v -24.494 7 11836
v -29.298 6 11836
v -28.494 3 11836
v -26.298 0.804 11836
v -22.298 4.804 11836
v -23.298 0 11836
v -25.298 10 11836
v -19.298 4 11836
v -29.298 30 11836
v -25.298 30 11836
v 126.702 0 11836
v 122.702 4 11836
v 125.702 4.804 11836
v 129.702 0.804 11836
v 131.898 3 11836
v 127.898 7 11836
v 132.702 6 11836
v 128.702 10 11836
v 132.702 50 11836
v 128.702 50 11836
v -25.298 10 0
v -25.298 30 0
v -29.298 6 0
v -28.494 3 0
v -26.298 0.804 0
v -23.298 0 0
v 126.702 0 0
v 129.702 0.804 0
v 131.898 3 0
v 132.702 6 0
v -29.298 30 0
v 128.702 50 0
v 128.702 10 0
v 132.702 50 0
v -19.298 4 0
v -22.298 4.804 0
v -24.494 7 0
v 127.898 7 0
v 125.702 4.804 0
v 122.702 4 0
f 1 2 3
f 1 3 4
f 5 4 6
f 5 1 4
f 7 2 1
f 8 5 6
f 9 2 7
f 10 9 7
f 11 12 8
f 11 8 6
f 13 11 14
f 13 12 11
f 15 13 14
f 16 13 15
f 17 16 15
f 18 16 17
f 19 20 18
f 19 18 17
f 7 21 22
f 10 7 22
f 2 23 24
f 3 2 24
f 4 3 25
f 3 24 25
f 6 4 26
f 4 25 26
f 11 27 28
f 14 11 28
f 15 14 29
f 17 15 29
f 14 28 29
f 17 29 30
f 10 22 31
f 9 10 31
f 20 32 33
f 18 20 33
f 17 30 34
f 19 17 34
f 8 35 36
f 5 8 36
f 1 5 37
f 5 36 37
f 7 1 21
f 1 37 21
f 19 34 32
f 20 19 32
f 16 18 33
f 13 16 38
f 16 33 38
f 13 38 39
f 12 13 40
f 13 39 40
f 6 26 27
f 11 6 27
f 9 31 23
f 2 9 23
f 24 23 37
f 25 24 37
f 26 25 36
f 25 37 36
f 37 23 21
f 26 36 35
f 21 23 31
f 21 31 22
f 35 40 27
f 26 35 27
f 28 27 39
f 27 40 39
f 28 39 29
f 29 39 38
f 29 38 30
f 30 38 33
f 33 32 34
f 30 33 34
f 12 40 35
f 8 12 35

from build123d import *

# Parameters (mm, degrees)
F1_DEPTH = 11836


with BuildPart() as f1:
    # F0 (on Top) → F1 (new body)
    with BuildSketch(Plane.XY):
        with BuildLine():
            Line((-25.298244, 30), (-29.298244, 30))
            Line((-29.298244, 30), (-29.298244, 6))
            ThreePointArc((-29.298244, 6), (-27.540884, 1.757359), (-23.298244, 0))
            Line((-23.298244, 0), (126.701756, 0))
            ThreePointArc((126.701756, 0), (130.944397, 1.757359), (132.701756, 6))
            Line((132.701756, 6), (132.701756, 50))
            Line((132.701756, 50), (128.701756, 50))
            Line((128.701756, 50), (128.701756, 10))
            ThreePointArc((128.701756, 10), (126.944397, 5.757359), (122.701756, 4))
            Line((122.701756, 4), (-19.298244, 4))
            ThreePointArc((-19.298244, 4), (-23.540884, 5.757359), (-25.298244, 10))
            Line((-25.298244, 10), (-25.298244, 30))
        make_face()
    extrude(amount=F1_DEPTH)


solid = f1.part
